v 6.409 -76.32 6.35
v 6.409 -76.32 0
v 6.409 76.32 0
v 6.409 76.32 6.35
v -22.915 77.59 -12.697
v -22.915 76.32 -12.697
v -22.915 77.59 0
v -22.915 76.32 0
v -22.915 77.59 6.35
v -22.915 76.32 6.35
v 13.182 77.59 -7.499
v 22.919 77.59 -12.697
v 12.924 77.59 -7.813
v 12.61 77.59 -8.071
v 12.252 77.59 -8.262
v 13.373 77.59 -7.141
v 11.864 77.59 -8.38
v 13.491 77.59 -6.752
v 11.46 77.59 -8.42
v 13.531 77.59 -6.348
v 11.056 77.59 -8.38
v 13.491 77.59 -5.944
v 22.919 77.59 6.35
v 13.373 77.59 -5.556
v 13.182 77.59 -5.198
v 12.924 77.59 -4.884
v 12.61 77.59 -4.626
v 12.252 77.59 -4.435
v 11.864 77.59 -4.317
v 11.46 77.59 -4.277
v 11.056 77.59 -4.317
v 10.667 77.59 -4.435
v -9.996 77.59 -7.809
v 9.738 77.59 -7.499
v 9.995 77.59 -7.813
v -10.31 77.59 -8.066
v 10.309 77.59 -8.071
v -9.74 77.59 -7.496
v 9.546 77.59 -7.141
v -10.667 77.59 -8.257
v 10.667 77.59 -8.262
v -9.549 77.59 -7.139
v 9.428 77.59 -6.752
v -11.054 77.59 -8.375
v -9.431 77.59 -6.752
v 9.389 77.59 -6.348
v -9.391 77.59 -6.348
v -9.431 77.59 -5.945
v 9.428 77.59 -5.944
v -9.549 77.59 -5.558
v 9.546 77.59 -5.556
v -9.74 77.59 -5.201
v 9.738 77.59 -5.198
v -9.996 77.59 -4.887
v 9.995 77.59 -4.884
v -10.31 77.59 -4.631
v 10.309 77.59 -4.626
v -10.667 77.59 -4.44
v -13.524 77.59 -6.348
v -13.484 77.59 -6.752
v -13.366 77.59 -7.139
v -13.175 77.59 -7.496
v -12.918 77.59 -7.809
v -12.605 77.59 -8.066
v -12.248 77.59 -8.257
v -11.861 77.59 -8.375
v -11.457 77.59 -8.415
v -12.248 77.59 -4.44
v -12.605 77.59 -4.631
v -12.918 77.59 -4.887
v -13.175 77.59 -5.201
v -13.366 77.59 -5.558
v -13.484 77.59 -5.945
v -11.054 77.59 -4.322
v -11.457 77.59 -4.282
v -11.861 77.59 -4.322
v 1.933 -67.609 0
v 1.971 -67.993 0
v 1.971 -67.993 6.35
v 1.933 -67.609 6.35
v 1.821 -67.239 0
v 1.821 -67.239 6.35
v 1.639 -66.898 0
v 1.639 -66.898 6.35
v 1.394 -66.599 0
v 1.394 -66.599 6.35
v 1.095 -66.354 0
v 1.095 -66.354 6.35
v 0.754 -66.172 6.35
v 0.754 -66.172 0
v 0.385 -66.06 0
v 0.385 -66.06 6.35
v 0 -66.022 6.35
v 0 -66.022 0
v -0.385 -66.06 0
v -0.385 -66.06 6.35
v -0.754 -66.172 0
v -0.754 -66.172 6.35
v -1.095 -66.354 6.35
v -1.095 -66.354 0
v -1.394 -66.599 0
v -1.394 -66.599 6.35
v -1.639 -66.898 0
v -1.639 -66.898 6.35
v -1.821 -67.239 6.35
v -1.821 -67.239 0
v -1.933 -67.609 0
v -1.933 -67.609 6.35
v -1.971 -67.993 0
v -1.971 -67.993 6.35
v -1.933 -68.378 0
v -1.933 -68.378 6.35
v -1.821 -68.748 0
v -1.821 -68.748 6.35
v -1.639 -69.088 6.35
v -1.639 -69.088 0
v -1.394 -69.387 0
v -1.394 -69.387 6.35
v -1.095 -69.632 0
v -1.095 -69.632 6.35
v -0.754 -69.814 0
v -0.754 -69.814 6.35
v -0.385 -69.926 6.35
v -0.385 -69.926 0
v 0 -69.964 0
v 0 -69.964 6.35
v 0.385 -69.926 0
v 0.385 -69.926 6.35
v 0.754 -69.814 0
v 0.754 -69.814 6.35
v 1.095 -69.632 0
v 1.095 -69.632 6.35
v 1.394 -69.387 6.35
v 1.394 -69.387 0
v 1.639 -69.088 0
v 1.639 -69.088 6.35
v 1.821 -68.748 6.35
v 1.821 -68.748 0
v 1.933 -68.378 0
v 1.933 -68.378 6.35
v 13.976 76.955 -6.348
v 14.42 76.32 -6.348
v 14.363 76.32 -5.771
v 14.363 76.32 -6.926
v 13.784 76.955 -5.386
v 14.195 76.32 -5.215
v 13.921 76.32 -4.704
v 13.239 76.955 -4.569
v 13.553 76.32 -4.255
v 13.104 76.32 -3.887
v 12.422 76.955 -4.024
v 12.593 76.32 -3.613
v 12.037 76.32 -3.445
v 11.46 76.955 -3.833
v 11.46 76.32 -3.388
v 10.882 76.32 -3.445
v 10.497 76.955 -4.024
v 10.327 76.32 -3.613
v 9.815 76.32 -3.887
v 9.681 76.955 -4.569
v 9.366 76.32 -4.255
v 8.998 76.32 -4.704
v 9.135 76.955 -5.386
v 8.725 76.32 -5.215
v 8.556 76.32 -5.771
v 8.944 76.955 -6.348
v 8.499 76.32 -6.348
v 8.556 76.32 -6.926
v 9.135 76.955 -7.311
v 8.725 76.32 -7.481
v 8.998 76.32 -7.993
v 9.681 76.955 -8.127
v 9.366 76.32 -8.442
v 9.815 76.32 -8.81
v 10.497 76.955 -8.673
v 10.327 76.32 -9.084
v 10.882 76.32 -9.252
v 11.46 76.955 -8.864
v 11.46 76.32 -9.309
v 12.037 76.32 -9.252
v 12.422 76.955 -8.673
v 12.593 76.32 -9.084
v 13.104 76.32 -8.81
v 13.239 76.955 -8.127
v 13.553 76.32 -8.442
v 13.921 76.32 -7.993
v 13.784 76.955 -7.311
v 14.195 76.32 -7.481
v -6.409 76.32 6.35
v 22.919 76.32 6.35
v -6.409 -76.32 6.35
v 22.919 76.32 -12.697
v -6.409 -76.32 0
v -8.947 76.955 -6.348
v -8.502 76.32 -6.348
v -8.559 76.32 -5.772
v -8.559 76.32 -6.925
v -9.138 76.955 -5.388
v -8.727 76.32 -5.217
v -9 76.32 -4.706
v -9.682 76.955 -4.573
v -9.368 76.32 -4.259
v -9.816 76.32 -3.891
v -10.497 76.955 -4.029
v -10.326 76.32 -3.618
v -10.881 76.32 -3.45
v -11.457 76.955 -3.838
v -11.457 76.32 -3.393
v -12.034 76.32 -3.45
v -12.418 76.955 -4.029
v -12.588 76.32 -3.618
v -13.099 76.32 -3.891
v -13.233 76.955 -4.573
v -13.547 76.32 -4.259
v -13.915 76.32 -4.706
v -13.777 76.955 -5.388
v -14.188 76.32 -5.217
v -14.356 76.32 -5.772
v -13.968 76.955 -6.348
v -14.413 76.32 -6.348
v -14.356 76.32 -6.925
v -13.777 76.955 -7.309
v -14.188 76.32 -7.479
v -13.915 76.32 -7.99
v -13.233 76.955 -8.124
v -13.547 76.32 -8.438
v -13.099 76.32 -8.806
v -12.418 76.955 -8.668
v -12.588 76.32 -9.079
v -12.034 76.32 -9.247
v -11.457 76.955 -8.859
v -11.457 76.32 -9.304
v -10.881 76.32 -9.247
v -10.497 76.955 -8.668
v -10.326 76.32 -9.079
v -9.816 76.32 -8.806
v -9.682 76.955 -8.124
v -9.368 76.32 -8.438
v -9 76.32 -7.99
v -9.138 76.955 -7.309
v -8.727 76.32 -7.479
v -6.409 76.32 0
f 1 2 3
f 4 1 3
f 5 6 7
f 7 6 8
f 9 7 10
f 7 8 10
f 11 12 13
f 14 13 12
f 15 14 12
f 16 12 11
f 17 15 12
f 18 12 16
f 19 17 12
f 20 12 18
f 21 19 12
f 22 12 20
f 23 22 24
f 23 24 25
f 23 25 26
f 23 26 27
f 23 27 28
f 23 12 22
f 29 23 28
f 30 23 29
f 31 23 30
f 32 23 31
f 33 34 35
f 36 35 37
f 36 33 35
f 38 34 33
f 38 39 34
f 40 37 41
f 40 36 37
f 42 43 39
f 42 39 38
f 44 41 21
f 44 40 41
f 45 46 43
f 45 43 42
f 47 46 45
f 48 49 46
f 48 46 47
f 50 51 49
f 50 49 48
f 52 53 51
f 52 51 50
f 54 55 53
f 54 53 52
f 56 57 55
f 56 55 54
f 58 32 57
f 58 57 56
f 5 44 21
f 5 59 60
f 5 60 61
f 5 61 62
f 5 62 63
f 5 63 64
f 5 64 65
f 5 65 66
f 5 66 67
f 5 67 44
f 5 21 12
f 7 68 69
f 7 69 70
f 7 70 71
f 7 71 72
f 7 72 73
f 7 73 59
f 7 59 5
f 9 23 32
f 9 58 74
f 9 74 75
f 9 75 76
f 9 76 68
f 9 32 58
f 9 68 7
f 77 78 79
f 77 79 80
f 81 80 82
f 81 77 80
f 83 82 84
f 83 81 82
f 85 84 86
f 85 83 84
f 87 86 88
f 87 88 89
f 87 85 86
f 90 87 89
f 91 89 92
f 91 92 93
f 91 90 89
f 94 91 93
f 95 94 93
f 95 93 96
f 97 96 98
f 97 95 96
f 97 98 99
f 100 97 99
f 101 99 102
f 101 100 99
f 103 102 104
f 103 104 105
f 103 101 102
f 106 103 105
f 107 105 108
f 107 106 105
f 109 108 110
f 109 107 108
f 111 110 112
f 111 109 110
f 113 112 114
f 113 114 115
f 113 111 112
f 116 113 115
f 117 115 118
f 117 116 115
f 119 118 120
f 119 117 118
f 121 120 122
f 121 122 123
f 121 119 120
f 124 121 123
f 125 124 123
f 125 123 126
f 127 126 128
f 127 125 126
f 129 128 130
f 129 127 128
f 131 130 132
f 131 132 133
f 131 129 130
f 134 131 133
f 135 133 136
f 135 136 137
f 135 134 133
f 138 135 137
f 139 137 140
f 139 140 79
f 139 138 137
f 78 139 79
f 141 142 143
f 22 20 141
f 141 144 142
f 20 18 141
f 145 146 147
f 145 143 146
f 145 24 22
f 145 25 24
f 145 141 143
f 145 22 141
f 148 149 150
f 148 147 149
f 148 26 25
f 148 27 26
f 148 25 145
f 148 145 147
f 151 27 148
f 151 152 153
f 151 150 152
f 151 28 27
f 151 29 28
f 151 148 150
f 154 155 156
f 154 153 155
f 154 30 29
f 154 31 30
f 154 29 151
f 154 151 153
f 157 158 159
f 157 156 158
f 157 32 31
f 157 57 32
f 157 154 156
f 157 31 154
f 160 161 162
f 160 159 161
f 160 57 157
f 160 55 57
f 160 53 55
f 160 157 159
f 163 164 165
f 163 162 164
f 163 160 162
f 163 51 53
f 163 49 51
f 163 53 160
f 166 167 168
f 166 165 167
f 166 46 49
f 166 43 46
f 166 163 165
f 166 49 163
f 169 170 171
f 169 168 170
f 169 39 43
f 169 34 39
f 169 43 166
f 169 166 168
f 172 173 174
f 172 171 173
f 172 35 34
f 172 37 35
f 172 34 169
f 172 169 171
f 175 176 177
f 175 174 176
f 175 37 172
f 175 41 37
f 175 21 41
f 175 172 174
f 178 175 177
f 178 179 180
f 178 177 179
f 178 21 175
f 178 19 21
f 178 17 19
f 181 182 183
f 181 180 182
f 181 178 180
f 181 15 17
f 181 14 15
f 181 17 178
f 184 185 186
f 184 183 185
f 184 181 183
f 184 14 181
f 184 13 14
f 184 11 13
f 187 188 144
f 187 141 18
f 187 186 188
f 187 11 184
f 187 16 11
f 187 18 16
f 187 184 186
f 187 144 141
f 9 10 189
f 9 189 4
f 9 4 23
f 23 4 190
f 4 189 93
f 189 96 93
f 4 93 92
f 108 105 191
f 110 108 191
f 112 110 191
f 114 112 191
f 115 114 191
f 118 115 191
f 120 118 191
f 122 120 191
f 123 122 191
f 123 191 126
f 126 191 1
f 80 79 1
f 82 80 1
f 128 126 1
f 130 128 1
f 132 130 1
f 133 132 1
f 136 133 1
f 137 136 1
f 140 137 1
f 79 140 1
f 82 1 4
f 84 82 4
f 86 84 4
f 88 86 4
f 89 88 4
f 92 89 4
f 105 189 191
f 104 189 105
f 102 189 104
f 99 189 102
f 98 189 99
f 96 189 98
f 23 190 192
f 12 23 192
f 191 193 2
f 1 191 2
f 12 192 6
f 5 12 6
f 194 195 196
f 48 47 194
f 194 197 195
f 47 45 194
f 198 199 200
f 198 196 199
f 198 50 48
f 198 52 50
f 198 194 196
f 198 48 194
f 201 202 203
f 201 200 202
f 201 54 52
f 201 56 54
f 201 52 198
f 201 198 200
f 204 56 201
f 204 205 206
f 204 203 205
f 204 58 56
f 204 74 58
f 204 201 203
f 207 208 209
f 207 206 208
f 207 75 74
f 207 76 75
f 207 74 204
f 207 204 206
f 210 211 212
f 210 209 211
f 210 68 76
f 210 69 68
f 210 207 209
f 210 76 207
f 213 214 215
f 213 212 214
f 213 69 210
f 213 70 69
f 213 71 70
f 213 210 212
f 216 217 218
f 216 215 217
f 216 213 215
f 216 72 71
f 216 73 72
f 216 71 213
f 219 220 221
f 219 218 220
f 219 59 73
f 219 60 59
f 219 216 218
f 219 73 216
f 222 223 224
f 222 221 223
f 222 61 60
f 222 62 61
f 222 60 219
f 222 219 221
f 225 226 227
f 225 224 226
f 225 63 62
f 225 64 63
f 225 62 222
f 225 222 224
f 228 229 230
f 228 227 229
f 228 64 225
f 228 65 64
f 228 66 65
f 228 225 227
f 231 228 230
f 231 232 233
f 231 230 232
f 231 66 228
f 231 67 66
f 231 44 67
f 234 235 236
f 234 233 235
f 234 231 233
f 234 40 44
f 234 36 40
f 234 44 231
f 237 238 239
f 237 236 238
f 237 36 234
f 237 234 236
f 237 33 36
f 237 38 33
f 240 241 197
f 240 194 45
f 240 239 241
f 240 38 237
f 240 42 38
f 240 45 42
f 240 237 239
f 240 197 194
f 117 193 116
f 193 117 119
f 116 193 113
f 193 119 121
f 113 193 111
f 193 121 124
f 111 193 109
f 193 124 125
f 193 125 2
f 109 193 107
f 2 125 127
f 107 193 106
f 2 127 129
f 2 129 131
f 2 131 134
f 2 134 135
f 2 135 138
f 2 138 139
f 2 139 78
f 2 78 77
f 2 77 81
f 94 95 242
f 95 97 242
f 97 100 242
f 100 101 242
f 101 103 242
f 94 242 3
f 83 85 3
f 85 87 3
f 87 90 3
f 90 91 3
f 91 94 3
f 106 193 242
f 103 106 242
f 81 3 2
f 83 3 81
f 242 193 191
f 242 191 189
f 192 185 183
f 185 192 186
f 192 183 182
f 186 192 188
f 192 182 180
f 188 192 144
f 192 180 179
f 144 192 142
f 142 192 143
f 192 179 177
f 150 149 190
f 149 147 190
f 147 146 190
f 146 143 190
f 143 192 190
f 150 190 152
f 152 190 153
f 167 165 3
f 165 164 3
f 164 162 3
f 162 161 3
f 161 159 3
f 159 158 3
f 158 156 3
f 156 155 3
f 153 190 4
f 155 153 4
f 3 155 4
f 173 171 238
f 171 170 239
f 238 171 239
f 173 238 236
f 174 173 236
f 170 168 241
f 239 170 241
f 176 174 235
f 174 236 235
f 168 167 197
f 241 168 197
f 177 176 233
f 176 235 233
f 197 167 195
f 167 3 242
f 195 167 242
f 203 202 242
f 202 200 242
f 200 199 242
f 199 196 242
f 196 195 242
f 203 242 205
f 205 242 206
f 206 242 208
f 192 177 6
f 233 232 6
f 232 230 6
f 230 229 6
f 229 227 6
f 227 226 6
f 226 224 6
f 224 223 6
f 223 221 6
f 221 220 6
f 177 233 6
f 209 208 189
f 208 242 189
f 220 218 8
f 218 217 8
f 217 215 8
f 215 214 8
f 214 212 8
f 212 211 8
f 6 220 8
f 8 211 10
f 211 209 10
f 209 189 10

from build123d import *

# Parameters (mm, degrees)
F0_W     = 12.8171369433
F0_H     = 152.6404321194
F0_R     = 1.9711085463
F1_DEPTH = 6.35
F2_W     = 12.8171369433
F2_H     = 6.35
F2_W_2   = 16.510868445
F2_W_3   = 16.5063254535
F3_DEPTH = 1.27
F4_R     = 2.9604656486
F4_R_2   = 2.9553822982
F5_DEPTH = 1.27
F5_TAPER = 35


with BuildPart() as f1:
    # F0 (on Top) → F1 (new body)
    with BuildSketch(Plane.XY):
        Rectangle(F0_W, F0_H)
        with Locations((0, -67.9932013154)):
            Circle(F0_R, mode=Mode.SUBTRACT)
    extrude(amount=F1_DEPTH)

    # F2 (on face) → F3 (join)
    with BuildSketch(Plane(origin=(0, 76.3202160597, 0), x_dir=(-1, 0, 0), z_dir=(0, 1, 0))):
        with Locations((0, 3.175)):
            Rectangle(F2_W, F2_H)
        with Locations((-14.6640026942, 3.175)):
            Rectangle(F2_W_2, F2_H)
        with Locations((14.6617311984, 3.175)):
            Rectangle(F2_W_3, F2_H)
        Polygon((6.4085684717, 0), (-6.4085684717, 0), (-22.9194369167, 0), (-22.9194369167, -12.6968417317), (22.9148939252, -12.6968417317), (22.9148939252, 0), align=None)
    extrude(amount=F3_DEPTH)

    # F4 (on face) → F5 (cut)
    with BuildSketch(Plane.XZ.offset(-76.3202160597)):
        with Locations((11.4597184584, -6.3484208658)):
            Circle(F4_R)
        with Locations((-11.4574469626, -6.3484208658)):
            Circle(F4_R_2)
    extrude(amount=-F5_DEPTH, taper=F5_TAPER, mode=Mode.SUBTRACT)


solid = f1.part
